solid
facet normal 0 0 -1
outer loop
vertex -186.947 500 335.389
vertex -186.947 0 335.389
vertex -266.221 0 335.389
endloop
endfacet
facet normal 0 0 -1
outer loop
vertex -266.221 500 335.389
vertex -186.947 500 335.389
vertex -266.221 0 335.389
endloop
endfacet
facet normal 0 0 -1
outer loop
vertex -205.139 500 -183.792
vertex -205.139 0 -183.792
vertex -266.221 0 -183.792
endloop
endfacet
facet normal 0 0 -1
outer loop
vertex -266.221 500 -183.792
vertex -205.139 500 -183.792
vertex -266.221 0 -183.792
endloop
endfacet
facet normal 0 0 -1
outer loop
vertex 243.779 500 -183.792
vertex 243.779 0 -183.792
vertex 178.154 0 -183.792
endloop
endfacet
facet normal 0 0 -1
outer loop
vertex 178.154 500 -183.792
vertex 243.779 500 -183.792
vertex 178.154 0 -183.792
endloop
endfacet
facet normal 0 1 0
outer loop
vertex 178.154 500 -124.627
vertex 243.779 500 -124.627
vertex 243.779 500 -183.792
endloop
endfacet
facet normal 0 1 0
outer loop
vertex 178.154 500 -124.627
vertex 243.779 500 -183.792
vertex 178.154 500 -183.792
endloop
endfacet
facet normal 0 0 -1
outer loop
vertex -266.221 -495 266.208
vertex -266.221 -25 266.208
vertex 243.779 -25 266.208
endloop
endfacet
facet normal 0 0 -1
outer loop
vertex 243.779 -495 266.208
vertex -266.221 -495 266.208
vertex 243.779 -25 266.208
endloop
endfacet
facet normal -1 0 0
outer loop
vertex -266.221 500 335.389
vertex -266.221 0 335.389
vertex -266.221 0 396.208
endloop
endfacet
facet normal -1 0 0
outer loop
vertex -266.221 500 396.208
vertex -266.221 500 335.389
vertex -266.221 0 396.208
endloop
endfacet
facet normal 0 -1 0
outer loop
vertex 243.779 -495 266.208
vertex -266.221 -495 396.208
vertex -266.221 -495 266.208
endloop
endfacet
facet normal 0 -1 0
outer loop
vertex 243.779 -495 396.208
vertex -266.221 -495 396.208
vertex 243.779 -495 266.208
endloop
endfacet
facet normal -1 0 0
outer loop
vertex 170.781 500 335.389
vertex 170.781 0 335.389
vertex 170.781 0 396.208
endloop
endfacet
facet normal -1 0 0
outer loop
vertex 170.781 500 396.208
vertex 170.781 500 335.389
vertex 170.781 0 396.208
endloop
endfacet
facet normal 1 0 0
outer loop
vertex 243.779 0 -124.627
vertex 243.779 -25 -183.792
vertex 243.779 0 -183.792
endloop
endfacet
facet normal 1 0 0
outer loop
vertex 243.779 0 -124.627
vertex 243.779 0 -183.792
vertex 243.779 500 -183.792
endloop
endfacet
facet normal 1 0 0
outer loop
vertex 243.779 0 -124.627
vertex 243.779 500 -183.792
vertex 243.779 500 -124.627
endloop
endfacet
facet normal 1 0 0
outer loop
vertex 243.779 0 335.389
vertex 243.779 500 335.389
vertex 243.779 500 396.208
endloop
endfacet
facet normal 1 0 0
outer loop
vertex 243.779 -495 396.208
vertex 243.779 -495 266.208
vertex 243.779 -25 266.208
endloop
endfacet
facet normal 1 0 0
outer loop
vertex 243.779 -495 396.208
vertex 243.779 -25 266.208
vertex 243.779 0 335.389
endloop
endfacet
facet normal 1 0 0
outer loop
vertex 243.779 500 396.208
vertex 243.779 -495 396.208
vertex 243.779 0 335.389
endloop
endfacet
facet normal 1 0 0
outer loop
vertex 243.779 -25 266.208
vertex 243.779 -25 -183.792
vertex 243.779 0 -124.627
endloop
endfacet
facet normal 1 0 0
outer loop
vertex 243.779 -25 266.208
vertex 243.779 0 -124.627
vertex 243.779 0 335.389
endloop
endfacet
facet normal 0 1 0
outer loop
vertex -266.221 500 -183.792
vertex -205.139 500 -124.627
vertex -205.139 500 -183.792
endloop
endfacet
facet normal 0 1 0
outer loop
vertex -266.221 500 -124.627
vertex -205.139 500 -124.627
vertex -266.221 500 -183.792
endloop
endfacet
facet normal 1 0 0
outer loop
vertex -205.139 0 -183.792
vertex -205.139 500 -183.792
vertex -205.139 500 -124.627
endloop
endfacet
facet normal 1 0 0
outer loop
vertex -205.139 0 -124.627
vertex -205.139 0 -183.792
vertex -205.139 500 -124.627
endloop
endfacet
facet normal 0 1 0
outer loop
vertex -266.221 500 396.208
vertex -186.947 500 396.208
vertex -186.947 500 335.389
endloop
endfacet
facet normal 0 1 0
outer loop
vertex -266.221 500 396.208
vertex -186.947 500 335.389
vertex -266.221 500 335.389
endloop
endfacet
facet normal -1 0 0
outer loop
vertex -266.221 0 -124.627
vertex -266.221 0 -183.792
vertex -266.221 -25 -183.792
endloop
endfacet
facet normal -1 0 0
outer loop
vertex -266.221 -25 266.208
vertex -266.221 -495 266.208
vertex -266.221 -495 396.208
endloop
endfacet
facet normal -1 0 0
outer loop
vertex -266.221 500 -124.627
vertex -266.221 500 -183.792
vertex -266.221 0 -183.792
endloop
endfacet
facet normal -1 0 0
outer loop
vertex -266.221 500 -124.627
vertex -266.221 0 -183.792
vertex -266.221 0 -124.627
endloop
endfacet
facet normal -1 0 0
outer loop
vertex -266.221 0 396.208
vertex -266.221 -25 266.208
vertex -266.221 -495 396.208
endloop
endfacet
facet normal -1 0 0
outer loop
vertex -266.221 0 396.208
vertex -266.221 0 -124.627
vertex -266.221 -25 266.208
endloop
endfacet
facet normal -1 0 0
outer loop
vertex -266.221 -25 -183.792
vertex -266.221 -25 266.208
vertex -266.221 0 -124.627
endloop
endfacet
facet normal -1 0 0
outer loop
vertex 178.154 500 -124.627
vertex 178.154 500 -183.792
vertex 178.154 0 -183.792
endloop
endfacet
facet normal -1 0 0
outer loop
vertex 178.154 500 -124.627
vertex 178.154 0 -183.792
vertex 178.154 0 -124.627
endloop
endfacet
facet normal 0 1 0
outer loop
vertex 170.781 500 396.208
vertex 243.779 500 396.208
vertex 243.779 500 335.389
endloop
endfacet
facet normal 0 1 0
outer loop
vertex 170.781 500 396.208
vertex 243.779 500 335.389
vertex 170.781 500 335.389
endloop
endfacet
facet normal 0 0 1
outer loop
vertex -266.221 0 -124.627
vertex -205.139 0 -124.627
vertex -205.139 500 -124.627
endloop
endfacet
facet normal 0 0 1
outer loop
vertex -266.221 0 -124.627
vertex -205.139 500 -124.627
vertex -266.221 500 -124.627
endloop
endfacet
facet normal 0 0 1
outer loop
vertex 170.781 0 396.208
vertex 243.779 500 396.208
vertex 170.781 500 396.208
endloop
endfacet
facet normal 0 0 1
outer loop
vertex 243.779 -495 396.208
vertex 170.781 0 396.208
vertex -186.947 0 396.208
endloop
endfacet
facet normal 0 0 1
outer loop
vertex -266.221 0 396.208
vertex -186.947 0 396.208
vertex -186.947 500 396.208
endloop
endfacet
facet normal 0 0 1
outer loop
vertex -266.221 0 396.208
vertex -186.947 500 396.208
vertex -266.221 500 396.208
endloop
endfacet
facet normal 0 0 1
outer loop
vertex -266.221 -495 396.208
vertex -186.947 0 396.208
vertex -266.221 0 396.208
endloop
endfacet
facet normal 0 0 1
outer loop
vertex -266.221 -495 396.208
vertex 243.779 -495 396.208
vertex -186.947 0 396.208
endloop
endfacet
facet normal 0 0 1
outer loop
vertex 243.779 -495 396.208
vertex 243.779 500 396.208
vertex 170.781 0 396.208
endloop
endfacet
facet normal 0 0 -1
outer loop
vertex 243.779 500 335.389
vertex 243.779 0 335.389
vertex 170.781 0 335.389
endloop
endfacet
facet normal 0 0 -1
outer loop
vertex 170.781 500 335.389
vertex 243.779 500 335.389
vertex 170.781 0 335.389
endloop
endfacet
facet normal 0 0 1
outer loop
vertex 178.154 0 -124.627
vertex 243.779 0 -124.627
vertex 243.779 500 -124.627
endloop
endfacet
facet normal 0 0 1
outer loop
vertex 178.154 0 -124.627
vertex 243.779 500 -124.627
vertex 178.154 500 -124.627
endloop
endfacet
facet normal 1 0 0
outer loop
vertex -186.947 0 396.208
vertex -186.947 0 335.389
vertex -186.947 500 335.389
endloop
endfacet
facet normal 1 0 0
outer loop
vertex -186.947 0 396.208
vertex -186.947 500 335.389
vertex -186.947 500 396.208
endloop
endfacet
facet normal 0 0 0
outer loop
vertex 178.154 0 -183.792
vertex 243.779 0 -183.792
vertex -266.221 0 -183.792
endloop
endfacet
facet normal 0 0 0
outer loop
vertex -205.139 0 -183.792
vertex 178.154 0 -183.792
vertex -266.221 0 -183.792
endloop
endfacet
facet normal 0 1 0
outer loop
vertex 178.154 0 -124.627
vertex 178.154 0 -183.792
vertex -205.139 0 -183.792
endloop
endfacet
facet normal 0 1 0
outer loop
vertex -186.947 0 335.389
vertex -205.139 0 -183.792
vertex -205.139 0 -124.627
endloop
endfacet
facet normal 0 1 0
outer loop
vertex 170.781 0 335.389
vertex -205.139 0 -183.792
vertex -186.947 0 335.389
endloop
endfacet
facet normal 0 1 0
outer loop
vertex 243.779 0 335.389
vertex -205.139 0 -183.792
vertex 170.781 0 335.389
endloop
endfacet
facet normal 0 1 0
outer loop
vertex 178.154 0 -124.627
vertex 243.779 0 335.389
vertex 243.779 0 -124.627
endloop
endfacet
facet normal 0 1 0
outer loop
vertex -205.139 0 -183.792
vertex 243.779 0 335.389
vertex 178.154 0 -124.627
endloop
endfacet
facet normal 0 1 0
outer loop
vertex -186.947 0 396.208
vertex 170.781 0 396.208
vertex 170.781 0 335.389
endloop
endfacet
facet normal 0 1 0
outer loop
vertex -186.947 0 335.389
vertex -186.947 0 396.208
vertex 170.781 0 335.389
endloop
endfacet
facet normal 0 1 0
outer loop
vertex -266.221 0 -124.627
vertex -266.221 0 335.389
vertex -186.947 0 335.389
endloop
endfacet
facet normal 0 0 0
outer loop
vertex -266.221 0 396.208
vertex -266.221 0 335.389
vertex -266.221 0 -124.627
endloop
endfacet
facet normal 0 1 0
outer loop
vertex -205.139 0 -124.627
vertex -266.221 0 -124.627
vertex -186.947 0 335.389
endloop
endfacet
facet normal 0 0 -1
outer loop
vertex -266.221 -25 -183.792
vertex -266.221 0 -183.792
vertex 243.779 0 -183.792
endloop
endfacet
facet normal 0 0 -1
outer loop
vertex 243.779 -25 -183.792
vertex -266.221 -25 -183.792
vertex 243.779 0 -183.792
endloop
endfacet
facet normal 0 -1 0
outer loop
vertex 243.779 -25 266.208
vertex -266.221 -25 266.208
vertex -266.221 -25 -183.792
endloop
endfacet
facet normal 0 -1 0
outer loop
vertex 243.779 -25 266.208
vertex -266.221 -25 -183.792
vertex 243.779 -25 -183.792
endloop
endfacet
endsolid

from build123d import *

# Parameters (mm, degrees)
F0_W     = 510
F0_H     = 580
F1_DEPTH = 25
F2_W     = 510
F2_H     = 130
F3_DEPTH = 470
F4_W     = 72.998022
F4_H     = 60.818438
F4_W_2   = 79.273899
F4_W_3   = 65.625256
F4_H_2   = 59.164775
F4_W_4   = 61.082054
F5_DEPTH = 500


with BuildPart() as f1:
    # F0 (on Front) → F1 (new body)
    with BuildSketch(Plane.XZ):
        with Locations((-11.220857, 106.207754)):
            Rectangle(F0_W, F0_H)
    extrude(amount=F1_DEPTH)

    # F2 (on face) → F3 (join)
    with BuildSketch(Plane.XZ.offset(25)):
        with Locations((-11.220857, 331.207754)):
            Rectangle(F2_W, F2_H)
    extrude(amount=F3_DEPTH)

    # F4 (on face) → F5 (join)
    with BuildSketch(Plane(origin=(0, 0, 0), x_dir=(-1, 0, 0), z_dir=(0, 1, 0))):
        with Locations((-207.280132, 365.798535)):
            Rectangle(F4_W, F4_H)
        with Locations((226.583907, 365.798535)):
            Rectangle(F4_W_2, F4_H)
        with Locations((-210.966515, -154.209858)):
            Rectangle(F4_W_3, F4_H_2)
        with Locations((235.67983, -154.209858)):
            Rectangle(F4_W_4, F4_H_2)
    extrude(amount=F5_DEPTH)


solid = f1.part
